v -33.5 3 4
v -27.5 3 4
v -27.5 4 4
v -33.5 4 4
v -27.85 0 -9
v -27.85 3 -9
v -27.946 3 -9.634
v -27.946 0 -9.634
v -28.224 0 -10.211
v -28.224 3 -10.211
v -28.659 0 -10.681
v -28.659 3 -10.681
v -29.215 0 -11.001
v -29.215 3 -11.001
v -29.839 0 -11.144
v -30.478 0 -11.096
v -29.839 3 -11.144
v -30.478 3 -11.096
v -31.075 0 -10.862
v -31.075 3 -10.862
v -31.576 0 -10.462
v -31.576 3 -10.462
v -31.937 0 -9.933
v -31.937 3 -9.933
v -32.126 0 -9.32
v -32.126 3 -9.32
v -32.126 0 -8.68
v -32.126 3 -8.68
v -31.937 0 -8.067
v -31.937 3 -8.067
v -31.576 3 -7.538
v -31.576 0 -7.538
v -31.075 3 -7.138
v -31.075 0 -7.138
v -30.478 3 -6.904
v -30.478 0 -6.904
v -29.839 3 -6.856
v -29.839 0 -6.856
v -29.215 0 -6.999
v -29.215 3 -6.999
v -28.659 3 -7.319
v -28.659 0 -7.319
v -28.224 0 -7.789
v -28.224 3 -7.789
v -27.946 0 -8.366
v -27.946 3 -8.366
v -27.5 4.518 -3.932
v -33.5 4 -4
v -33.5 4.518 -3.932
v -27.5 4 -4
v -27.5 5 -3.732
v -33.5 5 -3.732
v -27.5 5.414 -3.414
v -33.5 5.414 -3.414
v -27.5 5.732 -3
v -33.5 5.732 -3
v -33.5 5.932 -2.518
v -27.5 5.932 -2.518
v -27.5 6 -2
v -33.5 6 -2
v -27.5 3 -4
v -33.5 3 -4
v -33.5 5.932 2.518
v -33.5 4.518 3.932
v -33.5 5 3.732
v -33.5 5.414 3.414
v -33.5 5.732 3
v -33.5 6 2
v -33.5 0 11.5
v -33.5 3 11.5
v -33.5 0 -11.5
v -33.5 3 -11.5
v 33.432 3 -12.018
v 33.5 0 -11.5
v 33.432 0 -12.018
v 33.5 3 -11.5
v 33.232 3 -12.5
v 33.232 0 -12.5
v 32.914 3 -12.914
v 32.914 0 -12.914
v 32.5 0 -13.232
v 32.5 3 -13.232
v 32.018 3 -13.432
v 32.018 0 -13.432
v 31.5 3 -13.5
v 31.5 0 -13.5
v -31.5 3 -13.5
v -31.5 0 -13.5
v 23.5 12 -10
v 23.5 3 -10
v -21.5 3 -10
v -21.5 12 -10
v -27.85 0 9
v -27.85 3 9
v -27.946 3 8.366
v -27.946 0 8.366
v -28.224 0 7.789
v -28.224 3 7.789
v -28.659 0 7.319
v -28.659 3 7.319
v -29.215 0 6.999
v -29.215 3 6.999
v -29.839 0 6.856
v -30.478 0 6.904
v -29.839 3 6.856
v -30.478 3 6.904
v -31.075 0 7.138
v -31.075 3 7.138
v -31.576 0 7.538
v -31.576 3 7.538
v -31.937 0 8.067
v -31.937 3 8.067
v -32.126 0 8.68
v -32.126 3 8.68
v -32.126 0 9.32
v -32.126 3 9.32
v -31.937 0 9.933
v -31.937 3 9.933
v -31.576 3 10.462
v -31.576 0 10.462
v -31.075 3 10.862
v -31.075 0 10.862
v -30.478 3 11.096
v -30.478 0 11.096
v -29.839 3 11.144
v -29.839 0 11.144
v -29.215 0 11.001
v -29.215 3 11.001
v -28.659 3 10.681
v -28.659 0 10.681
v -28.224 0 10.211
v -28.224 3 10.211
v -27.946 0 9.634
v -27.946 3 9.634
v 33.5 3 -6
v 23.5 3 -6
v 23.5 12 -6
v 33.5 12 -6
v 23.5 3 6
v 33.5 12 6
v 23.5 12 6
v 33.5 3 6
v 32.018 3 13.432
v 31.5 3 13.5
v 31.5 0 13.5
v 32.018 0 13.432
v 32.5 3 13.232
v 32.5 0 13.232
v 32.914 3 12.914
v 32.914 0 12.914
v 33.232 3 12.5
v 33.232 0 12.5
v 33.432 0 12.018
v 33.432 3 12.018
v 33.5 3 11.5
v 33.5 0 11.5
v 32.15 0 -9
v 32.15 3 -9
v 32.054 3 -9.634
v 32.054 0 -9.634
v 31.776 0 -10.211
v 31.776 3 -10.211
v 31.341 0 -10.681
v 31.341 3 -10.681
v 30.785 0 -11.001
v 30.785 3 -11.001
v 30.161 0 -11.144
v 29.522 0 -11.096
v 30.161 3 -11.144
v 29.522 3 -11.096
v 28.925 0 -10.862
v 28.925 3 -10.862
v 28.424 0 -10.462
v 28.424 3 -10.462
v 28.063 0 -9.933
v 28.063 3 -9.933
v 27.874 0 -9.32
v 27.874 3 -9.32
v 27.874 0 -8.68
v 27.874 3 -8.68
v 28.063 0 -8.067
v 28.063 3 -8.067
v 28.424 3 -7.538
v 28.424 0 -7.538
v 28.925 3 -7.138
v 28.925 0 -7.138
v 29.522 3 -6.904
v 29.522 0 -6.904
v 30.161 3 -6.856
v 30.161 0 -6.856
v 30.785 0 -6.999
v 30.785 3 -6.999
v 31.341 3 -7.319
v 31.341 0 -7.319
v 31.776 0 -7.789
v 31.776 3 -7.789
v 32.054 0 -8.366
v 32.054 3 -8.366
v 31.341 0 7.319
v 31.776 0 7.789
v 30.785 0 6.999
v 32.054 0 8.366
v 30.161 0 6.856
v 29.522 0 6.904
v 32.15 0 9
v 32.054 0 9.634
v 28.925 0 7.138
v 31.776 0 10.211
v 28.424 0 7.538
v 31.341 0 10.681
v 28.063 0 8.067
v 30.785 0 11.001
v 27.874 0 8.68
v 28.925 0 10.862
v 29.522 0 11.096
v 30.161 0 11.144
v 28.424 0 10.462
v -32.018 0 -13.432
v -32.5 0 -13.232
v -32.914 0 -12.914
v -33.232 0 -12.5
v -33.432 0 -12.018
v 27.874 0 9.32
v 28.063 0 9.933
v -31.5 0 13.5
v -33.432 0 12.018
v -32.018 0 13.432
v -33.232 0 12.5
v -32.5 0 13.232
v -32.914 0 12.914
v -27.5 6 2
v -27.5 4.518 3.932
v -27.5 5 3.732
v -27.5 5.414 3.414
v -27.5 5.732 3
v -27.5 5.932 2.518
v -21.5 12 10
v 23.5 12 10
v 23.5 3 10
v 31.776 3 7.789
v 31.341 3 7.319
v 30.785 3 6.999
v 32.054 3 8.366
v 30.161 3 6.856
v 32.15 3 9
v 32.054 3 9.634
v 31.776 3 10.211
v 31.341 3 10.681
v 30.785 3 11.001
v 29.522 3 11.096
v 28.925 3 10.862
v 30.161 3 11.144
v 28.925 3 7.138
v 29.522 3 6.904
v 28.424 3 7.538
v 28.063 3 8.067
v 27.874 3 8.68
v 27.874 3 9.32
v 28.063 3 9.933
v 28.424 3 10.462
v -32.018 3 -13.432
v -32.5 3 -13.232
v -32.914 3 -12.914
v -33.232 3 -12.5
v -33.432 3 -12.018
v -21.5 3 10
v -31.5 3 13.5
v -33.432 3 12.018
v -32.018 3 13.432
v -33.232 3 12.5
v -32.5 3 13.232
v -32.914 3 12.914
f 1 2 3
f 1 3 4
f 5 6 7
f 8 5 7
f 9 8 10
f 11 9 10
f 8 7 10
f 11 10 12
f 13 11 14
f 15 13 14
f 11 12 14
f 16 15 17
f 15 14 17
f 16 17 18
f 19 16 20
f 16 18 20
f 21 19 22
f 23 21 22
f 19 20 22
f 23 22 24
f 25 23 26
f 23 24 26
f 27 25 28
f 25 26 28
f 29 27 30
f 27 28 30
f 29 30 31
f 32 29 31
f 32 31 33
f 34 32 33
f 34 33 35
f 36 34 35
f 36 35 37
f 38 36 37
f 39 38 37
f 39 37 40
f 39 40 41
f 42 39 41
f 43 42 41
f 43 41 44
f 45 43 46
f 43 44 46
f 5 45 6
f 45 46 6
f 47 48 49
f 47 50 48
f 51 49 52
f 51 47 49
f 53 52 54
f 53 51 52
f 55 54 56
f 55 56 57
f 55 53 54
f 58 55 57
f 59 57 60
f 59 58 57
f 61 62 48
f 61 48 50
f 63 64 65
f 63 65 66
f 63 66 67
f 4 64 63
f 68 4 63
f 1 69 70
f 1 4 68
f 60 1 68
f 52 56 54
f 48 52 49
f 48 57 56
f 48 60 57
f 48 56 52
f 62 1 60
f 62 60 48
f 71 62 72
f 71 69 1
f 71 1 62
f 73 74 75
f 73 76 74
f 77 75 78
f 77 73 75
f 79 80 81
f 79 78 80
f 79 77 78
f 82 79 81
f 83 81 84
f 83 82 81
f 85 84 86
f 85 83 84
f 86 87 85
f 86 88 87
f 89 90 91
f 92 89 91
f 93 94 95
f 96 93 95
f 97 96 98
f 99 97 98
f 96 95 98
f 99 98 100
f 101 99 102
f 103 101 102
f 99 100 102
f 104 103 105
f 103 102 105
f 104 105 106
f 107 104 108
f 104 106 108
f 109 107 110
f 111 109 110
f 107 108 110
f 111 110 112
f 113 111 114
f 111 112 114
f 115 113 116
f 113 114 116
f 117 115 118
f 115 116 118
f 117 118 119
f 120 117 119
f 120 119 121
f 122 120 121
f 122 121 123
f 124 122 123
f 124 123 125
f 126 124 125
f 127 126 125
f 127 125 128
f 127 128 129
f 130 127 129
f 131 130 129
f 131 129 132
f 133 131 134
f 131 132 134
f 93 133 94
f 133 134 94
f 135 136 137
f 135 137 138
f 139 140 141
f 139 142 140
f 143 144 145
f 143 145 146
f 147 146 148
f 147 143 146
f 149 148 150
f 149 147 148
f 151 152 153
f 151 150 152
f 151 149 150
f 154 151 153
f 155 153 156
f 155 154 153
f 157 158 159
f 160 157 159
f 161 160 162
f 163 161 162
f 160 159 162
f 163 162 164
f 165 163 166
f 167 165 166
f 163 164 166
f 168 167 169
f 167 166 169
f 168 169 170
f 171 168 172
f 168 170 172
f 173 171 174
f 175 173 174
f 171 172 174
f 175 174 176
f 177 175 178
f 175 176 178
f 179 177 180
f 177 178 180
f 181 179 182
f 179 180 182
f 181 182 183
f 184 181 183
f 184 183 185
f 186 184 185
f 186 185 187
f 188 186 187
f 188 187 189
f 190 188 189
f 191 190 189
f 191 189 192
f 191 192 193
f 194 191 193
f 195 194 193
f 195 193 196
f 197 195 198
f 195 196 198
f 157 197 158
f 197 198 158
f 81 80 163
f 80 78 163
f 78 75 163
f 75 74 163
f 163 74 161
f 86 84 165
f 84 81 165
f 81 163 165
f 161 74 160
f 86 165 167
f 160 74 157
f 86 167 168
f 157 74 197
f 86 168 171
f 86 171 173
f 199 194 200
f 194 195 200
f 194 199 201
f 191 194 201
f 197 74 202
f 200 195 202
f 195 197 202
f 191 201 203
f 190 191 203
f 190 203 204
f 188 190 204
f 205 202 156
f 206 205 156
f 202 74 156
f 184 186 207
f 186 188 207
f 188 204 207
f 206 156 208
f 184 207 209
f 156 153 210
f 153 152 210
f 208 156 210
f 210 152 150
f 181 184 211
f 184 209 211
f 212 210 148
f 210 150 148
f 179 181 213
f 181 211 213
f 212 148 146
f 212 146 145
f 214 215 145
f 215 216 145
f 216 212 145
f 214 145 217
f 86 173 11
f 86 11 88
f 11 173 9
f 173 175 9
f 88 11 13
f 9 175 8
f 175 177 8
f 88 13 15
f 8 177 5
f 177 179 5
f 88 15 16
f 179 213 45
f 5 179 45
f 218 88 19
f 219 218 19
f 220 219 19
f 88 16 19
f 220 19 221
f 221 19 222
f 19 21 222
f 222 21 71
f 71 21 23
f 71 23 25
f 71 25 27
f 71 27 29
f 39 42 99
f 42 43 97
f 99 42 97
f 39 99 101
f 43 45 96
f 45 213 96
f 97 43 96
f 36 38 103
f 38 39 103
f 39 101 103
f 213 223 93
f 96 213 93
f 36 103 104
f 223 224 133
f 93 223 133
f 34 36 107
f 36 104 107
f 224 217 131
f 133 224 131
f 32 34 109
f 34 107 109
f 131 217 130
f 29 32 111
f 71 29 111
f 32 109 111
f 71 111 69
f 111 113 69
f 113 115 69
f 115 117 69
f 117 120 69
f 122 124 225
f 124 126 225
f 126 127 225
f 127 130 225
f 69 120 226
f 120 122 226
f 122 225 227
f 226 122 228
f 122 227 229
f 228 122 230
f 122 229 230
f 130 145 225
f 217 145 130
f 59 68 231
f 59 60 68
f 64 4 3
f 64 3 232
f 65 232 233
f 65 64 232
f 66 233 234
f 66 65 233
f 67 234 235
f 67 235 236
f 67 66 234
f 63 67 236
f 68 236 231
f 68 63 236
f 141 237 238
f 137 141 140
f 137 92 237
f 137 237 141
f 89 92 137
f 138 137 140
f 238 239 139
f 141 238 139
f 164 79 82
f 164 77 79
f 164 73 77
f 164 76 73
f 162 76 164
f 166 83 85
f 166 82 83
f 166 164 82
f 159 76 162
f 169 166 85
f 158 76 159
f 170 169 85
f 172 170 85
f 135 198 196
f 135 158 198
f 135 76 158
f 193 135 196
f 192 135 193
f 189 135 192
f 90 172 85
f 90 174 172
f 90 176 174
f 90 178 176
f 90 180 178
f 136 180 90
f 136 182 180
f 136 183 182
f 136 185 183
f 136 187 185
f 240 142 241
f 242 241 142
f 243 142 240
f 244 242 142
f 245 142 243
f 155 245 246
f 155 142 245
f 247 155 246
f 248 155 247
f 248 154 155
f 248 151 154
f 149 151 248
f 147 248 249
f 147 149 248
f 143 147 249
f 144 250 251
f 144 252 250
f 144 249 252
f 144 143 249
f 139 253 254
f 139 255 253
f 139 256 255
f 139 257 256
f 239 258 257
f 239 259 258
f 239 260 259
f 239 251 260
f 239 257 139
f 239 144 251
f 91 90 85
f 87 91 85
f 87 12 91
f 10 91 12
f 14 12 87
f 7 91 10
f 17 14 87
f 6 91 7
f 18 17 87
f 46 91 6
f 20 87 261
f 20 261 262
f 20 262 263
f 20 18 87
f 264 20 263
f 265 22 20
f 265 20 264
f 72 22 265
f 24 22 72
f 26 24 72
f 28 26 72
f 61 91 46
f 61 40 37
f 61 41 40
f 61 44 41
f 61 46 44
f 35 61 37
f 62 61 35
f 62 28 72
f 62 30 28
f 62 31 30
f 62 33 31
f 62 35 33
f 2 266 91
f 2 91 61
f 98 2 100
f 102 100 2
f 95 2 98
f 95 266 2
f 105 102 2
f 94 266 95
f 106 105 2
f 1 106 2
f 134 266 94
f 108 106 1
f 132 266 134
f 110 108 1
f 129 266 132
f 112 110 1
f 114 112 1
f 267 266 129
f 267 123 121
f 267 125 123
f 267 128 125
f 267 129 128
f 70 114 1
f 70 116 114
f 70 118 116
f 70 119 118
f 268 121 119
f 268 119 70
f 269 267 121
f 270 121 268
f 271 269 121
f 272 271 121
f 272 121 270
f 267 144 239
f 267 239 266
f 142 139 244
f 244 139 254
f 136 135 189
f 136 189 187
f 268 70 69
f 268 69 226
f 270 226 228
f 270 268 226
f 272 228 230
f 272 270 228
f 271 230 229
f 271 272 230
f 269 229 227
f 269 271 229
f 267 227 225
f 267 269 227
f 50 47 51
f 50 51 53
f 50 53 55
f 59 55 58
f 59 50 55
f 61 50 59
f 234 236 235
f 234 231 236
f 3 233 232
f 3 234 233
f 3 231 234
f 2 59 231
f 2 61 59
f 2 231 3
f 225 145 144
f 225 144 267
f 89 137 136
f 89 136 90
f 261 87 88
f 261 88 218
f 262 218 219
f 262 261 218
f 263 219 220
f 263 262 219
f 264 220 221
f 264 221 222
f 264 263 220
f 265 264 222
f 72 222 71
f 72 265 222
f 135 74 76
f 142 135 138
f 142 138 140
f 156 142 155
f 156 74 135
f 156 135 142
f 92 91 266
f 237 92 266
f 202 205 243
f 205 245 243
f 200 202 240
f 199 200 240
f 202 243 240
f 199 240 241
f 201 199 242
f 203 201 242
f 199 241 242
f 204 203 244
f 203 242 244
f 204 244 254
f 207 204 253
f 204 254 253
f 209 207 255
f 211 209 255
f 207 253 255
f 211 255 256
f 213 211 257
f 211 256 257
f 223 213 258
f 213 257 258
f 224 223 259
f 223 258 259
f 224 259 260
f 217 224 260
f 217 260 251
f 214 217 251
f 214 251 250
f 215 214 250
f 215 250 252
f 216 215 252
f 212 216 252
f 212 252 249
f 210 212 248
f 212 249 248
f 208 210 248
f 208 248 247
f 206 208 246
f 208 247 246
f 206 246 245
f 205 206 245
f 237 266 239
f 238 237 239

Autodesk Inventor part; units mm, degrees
ref_plane "YZ Plane" through (0, 0, 0) normal (1, 0, 0) x (0, 1, 0)
ref_plane "XZ Plane" through (0, 0, 0) normal (0, 1, 0) x (-1, 0, 0)
ref_plane "XY Plane" through (0, 0, 0) normal (0, 0, 1) x (1, 0, 0)
sketch "Sketch1" plane through (0, 0, 0) normal (0, 1, 0) x (-1, 0, 0)
  line L0 (33.5, -13.5) -> (-33.5, -13.5)
  line L1 (-33.5, -13.5) -> (-33.5, 13.5)
  line L2 (-33.5, 13.5) -> (33.5, 13.5)
  line L3 (33.5, 13.5) -> (33.5, -13.5)
  line L4 (0, 0) -> (86.7229, 0) construction
  line L5 (0, 0) -> (0, 45.1017) construction
  dimension "d0" = 27
  dimension "d1" = 67
extrude "Extrusion1" add sketch "Sketch1" along normal blind 3
sketch "Sketch2" plane through (0, 3, 0) normal (0, 1, 0) x (1, 0, 0)
  line L0 (33.5, 13.5) -> (-33.5, 13.5) projected
  line L1 (33.5, -13.5) -> (33.5, 13.5) projected
  line L2 (0, 0) -> (26.8835, 0) construction
  line L3 (0, 0) -> (0, 11.9949) construction
  circle A0 centre (30, 9) radius 2.15
  circle A1 centre (-30, 9) radius 2.15
  circle A2 centre (30, -9) radius 2.15
  circle A3 centre (-30, -9) radius 2.15
  dimension "d4" = 4.3
  dimension "d5" = 3.5
  dimension "d6" = 4.5
extrude "Extrusion2" cut sketch "Sketch2" against normal through all
fillet "Fillet1" radius 2 4 edges at (-33.5, 1.5, 13.5) (-33.5, 1.5, -13.5) (33.5, 1.5, -13.5) (33.5, 1.5, 13.5)
sketch "Sketch3" plane through (0, 3, 0) normal (0, 1, 0) x (1, 0, 0)
  line L0 (33.5, -11.5) -> (33.5, 11.5) projected
  line L1 (23.5, 6) -> (33.5, 6)
  line L2 (33.5, 6) -> (33.5, -6)
  line L3 (33.5, -6) -> (23.5, -6)
  line L4 (23.5, -6) -> (23.5, 6)
  line L5 (0, 0) -> (50.7888, 0) construction
  line L6 (23.5, 10) -> (-21.5, 10)
  line L7 (-21.5, 10) -> (-21.5, -10)
  line L8 (-21.5, -10) -> (23.5, -10)
  line L9 (23.5, -10) -> (23.5, 10)
  dimension "d10" = 10
  dimension "d11" = 12
  dimension "d12" = 20
  dimension "d13" = 45
extrude "Extrusion3" add sketch "Sketch3" along normal blind 9
sketch "Sketch4" plane through (0, 3, 0) normal (0, 1, 0) x (1, 0, 0)
  line L0 (-33.5, 11.5) -> (-33.5, -11.5) projected
  line L1 (-33.5, 4) -> (-27.5, 4)
  line L2 (-27.5, 4) -> (-27.5, -4)
  line L3 (-27.5, -4) -> (-33.5, -4)
  line L4 (-33.5, -4) -> (-33.5, 4)
  line L5 (0, 0) -> (-50.5157, 0) construction
  dimension "d16" = 6
  dimension "d17" = 8
extrude "Extrusion4" add sketch "Sketch4" along normal blind 3
fillet "Fillet2" radius 2 2 edges at (-30.5, 6, 4) (-30.5, 6, -4)
properties part number "Board"
